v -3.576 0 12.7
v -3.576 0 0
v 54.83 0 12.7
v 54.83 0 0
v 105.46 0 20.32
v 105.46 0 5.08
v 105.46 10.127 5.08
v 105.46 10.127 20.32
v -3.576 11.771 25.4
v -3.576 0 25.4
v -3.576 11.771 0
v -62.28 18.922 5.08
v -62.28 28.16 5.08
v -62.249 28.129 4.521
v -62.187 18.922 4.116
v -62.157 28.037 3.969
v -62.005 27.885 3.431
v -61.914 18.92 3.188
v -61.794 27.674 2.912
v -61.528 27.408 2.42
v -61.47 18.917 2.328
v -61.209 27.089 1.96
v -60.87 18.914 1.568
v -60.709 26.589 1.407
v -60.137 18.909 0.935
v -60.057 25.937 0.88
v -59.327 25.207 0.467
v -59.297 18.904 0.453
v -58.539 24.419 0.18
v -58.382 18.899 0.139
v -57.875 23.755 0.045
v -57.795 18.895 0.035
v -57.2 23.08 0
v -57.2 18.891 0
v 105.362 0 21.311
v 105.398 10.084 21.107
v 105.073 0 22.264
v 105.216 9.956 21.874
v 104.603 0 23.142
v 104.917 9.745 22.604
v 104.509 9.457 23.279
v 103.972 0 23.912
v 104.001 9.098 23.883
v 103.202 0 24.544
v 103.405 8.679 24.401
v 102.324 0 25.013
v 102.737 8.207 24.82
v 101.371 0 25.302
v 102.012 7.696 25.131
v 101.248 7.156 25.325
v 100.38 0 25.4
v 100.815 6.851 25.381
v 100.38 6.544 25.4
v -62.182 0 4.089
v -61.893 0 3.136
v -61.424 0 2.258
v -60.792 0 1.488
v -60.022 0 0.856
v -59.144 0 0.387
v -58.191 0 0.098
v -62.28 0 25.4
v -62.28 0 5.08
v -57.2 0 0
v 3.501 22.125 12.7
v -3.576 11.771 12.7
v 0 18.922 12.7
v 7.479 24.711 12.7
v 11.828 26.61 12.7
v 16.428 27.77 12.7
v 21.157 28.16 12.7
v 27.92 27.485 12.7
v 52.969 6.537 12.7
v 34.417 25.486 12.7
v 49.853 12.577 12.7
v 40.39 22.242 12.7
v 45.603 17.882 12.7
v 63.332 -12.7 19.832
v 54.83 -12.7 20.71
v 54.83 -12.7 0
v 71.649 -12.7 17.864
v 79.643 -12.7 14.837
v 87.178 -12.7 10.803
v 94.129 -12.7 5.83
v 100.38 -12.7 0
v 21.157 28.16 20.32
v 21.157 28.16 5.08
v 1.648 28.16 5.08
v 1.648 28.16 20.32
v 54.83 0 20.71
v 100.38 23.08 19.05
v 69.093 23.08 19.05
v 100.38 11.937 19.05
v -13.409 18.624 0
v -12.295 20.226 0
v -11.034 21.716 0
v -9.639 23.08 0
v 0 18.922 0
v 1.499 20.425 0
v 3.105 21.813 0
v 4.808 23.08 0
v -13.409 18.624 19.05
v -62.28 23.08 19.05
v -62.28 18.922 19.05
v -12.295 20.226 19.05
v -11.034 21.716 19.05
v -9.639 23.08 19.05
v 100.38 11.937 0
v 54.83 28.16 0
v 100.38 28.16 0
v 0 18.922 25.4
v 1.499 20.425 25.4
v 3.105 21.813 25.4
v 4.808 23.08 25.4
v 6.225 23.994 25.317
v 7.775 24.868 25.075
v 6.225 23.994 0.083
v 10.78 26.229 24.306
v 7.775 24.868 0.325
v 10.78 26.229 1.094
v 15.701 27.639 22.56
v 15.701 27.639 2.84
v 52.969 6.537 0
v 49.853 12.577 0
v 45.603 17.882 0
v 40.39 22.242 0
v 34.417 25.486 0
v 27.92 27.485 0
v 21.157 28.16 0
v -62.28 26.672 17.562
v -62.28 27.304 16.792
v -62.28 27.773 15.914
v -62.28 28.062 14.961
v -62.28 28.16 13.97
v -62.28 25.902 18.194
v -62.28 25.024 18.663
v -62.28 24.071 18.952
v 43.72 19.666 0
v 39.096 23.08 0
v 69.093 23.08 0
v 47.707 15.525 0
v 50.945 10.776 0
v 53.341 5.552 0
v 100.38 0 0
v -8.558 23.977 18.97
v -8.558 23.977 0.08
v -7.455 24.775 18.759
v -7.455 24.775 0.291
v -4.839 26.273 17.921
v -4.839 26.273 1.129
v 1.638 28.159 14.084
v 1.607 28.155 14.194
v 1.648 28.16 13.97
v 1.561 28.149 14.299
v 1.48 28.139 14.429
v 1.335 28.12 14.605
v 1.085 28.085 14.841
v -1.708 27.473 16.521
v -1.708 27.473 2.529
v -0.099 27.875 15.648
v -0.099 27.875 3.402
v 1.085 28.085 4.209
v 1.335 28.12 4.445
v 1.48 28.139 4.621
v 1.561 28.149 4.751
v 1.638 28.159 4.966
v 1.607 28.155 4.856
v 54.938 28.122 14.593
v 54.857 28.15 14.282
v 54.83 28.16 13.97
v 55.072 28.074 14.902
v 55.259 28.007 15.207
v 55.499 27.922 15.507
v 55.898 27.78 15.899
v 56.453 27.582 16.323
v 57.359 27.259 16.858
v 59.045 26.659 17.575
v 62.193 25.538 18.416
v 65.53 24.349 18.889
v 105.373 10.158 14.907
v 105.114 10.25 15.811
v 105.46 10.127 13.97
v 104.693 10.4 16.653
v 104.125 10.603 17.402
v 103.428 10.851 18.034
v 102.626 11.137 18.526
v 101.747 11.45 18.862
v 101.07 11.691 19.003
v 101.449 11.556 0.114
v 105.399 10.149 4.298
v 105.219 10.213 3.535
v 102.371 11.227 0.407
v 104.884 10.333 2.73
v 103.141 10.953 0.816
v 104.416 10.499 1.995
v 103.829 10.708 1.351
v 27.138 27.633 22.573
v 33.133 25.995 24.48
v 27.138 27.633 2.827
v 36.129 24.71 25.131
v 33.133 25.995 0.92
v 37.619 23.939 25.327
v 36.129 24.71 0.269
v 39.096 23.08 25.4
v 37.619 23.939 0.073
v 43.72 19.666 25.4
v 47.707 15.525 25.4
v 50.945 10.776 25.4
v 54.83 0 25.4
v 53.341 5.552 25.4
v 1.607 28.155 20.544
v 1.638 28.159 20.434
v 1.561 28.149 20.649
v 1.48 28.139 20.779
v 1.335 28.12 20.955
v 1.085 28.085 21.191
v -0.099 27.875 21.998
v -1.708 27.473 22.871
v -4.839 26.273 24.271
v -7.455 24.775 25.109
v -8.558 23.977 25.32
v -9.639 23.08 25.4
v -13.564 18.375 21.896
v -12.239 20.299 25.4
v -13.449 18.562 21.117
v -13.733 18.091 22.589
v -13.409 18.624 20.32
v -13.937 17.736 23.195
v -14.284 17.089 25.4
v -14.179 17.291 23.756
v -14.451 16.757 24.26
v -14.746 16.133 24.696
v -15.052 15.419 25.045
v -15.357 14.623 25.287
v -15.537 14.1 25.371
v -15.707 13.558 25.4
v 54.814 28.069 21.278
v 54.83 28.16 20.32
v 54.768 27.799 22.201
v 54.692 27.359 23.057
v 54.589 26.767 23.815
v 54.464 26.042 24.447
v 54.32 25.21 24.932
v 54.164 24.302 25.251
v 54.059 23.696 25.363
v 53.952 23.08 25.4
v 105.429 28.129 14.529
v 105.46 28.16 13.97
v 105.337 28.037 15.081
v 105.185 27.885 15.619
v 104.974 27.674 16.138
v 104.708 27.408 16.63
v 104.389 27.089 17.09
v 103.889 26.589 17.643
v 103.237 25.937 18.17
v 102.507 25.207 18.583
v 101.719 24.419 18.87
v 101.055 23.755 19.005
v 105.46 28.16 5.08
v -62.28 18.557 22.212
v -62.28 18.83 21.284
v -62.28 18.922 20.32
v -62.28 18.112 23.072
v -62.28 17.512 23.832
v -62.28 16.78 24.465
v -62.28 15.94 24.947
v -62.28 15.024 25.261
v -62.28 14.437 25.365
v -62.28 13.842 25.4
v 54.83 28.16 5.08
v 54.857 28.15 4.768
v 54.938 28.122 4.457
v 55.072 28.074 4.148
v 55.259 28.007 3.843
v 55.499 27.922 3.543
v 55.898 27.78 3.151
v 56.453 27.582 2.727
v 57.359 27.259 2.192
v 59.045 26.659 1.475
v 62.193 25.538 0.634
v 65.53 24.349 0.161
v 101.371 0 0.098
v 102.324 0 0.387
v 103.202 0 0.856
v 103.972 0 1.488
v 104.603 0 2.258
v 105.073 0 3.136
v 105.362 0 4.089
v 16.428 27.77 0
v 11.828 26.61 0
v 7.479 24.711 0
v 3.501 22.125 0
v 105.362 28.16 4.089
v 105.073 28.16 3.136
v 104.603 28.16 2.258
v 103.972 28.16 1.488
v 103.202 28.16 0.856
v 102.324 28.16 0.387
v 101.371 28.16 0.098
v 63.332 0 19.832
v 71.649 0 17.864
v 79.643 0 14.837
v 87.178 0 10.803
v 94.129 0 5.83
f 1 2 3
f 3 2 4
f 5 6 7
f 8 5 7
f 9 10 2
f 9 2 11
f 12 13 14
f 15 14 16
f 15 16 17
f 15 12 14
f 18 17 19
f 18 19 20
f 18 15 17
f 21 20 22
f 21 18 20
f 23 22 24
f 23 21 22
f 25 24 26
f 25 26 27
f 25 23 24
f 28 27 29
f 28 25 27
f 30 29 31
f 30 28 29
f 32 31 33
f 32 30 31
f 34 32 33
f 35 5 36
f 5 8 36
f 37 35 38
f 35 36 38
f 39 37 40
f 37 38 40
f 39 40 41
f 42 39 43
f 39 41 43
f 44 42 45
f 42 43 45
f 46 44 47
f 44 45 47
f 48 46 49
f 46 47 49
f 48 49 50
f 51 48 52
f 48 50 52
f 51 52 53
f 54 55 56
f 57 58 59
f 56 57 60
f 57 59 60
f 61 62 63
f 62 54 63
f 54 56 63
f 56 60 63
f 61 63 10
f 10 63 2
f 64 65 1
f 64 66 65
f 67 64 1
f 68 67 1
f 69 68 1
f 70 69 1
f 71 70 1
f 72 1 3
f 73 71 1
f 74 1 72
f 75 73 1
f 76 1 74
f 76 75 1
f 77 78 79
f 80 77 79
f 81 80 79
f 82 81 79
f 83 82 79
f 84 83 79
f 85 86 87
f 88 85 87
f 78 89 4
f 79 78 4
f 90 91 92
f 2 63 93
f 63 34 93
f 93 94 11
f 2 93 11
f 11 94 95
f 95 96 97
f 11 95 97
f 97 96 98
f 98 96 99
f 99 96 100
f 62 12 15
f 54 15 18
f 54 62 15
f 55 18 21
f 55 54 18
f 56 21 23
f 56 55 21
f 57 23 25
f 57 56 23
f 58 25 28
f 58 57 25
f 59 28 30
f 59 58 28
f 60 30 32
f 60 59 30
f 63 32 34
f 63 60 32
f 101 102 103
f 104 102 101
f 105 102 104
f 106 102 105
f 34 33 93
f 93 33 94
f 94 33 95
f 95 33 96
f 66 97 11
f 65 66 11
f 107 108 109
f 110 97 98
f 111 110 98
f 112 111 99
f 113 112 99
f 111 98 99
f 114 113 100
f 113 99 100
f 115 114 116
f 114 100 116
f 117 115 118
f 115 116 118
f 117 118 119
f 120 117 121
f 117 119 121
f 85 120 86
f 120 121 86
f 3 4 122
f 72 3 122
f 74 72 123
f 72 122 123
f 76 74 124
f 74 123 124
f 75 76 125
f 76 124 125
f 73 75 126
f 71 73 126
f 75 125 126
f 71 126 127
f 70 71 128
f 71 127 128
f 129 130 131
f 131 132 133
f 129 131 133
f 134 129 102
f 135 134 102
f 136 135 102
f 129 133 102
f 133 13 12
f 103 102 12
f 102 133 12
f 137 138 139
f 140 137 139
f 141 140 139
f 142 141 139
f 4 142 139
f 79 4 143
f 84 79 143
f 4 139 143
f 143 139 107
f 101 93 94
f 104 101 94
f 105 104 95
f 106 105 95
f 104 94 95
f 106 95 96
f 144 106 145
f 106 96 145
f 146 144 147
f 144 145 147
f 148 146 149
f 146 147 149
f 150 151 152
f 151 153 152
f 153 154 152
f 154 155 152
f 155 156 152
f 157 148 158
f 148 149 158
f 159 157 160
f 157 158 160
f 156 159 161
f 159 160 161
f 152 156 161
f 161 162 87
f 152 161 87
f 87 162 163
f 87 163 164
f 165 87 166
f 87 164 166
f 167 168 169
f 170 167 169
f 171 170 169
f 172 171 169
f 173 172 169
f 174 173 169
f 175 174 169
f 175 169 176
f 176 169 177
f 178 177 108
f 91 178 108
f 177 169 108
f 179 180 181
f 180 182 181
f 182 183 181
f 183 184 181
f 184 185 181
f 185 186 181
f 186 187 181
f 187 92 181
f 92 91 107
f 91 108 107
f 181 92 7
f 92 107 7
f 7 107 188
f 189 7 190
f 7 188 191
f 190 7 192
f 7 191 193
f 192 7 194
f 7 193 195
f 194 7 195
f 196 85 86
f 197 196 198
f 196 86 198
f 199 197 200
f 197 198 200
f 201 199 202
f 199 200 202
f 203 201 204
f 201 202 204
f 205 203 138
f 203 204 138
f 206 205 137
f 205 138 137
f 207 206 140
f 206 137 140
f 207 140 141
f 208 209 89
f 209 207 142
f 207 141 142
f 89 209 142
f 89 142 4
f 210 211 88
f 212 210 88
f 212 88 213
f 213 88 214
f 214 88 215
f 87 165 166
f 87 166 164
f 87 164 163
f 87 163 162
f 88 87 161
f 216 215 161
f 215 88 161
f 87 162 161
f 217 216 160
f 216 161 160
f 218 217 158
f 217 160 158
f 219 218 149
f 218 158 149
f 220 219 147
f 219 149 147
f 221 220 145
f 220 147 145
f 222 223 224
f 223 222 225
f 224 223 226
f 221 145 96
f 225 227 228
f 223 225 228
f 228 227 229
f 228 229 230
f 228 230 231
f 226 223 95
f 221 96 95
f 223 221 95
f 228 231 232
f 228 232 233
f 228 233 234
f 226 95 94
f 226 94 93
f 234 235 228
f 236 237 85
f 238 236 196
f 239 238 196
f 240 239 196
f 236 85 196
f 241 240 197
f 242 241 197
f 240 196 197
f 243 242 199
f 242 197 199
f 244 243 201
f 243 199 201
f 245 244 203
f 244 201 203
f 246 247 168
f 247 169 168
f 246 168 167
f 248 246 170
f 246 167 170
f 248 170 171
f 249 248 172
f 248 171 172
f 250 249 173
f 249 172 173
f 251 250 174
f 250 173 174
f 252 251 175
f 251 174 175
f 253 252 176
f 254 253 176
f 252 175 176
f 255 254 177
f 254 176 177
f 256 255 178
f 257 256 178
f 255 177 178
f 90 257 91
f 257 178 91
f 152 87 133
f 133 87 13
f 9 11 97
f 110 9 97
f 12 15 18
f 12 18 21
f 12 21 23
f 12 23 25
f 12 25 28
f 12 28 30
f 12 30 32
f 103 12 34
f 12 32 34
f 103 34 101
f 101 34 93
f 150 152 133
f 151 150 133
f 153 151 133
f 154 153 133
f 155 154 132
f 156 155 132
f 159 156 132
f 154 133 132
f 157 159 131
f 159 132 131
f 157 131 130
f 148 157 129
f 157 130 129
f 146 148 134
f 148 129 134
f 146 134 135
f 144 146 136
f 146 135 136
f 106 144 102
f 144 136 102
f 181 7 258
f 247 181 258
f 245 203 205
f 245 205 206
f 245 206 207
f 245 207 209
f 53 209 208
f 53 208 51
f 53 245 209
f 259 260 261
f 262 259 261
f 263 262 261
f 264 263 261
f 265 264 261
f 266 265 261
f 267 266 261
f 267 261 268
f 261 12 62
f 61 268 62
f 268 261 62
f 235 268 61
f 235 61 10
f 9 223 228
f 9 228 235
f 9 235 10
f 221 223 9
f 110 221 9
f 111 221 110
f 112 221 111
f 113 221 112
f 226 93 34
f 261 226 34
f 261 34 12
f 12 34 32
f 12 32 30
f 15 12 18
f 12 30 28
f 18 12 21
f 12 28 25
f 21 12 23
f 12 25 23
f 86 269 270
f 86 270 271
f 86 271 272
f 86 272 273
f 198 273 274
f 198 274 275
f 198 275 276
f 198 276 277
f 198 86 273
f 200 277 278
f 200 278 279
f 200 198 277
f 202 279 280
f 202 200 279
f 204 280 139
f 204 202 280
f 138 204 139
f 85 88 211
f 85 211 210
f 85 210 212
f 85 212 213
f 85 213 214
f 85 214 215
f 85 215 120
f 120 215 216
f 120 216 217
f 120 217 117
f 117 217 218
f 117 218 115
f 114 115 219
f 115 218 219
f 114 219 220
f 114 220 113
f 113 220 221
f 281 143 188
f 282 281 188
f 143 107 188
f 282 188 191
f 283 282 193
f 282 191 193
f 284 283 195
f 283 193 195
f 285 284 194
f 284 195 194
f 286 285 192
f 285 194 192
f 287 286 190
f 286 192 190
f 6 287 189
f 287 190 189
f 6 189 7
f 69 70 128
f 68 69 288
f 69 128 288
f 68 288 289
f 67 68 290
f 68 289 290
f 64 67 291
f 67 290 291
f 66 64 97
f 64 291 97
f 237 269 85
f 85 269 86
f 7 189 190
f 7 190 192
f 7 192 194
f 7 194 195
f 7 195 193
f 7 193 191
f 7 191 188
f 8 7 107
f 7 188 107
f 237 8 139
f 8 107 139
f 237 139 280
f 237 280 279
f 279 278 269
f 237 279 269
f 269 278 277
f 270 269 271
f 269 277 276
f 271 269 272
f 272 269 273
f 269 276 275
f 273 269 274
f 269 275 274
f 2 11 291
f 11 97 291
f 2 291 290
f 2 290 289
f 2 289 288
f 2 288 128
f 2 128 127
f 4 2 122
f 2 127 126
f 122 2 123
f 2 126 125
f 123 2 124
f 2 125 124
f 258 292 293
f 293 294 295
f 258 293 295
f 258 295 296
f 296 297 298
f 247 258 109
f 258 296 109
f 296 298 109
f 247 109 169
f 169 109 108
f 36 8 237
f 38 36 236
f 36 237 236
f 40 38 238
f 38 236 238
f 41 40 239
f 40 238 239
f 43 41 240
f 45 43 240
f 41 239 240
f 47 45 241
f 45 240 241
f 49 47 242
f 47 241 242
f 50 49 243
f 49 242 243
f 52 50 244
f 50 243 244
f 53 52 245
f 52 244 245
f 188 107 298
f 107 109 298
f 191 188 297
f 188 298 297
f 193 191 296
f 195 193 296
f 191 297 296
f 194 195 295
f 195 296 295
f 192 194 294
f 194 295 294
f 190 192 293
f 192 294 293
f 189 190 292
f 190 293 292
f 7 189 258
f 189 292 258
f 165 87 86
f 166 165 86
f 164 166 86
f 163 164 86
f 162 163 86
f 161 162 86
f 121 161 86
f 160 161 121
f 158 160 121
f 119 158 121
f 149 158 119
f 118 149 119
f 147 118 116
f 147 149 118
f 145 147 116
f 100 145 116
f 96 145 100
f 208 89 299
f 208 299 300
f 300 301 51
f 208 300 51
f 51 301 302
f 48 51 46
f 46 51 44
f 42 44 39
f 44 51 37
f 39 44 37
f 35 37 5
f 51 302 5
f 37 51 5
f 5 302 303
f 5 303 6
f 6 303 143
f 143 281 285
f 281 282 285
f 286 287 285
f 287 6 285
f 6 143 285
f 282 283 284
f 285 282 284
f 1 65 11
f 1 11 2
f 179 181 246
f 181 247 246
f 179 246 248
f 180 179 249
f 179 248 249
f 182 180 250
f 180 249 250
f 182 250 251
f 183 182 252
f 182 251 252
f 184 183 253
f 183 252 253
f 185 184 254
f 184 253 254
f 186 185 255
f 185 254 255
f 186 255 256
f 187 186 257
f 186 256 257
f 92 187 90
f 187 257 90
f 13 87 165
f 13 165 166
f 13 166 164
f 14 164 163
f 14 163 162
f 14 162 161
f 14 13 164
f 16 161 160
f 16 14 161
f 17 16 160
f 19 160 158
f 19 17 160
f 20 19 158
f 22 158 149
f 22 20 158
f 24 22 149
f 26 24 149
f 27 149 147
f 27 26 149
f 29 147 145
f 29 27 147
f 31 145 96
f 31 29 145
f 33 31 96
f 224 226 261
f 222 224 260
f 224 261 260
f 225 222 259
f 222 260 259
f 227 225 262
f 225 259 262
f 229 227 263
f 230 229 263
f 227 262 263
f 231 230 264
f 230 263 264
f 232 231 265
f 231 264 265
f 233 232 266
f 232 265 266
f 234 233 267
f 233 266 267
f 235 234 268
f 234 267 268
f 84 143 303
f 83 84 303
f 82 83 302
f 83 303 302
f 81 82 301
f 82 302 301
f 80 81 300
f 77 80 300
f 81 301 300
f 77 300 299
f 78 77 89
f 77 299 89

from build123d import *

# Parameters (mm, degrees)
F1_DEPTH = 25.4
F2_DEPTH = 19.05
F3_DEPTH = 12.7
F4_R     = 5.08
F4_2_R   = 5.08
F4_3_R   = 5.08
F4_4_R   = 5.08
F5_R     = 5.08
F5_2_R   = 5.08
F5_3_R   = 5.08
F5_4_R   = 5.08
F7_DEPTH = 12.7


with BuildPart() as f1:
    # F0 (on Top) → F1 (new body)
    with BuildSketch(Plane.XY):
        with BuildLine():
            Line((-62.2796677053, 18.9222916961), (-62.2796677053, 0))
            Line((-62.2796677053, 0), (-3.5758661106, 0))
            Line((-3.5758661106, 0), (-3.5758661106, 11.7705585435))
            Line((-3.5758661106, 11.7705585435), (0, 18.9222916961))
            ThreePointArc((0, 18.9222916961), (9.6142260587, 25.7498536747), (21.1572069675, 28.1599443406))
            Line((21.1572069675, 28.1599443406), (6.5557546914, 28.1599443406))
            Line((6.5557546914, 28.1599443406), (1.6481696245, 28.1599443406))
            ThreePointArc((1.6481696245, 28.1599443406), (-6.9608101144, 25.0977753778), (-13.409496285, 18.6243019998))
            Line((-13.409496285, 18.6243019998), (-62.2796677053, 18.9222916961))
        make_face()
    extrude(amount=F1_DEPTH)

    # F4#3
    f4_3_edges = [f1.edges().sort_by_distance(p)[0] for p in [
        (-37.844582, 18.773297, 25.4),
        (11.402688, 28.159944, 25.4),
    ]]
    fillet(f4_3_edges, radius=F4_3_R)

    # F5#3
    f5_3_edges = [f1.edges().sort_by_distance(p)[0] for p in [
        (11.402688, 28.159944, 0),
        (-62.279668, 9.461146, 0),
    ]]
    fillet(f5_3_edges, radius=F5_3_R)


with BuildPart() as f1b:
    # F0 (on Top) → F1, piece 2 (new body)
    with BuildSketch(Plane.XY):
        with BuildLine():
            ThreePointArc((21.1572069675, 28.1599443406), (43.1050751982, 20.1921357641), (54.8299439251, 0))
            Line((54.8299439251, 0), (105.4596230388, 0))
            Line((105.4596230388, 0), (105.4596230388, 10.1274566612))
            Line((105.4596230388, 10.1274566612), (54.8299439251, 28.1599443406))
            Line((54.8299439251, 28.1599443406), (21.1572069675, 28.1599443406))
        make_face()
    extrude(amount=F1_DEPTH)

    # F4
    f4_edges = [f1b.edges().sort_by_distance(p)[0] for p in [
        (80.144783, 19.143701, 25.4),
        (105.459623, 5.063728, 25.4),
        (37.993575, 28.159944, 25.4),
    ]]
    fillet(f4_edges, radius=F4_R)

    # F5
    f5_edges = [f1b.edges().sort_by_distance(p)[0] for p in [
        (105.459623, 5.063728, 0),
        (37.993575, 28.159944, 0),
    ]]
    fillet(f5_edges, radius=F5_R)

    # F6 (on face) → F7 (join)
    with BuildSketch(Plane.XZ):
        with BuildLine():
            Line((54.8299439251, 0), (100.3796230388, 0))
            ThreePointArc((100.3796230388, 0), (79.6426113996, 14.8370726692), (54.8299439251, 20.7102242857))
            Line((54.8299439251, 20.7102242857), (54.8299439251, 0))
        make_face()
    extrude(amount=F7_DEPTH)


with BuildPart() as f2:
    # F0 (on Top) → F2 (new body)
    with BuildSketch(Plane.XY):
        with BuildLine():
            Line((-62.2796677053, 28.1599443406), (-62.2796677053, 18.9222916961))
            Line((-62.2796677053, 18.9222916961), (-13.409496285, 18.6243019998))
            ThreePointArc((-13.409496285, 18.6243019998), (-6.9608101144, 25.0977753778), (1.6481696245, 28.1599443406))
            Line((1.6481696245, 28.1599443406), (-62.2796677053, 28.1599443406))
        make_face()
    extrude(amount=F2_DEPTH)

    # F4#4
    f4_4_edges = [f2.edges().sort_by_distance(p)[0] for p in [
        (-30.315749, 28.159944, 19.05),
    ]]
    fillet(f4_4_edges, radius=F4_4_R)

    # F5#4
    f5_4_edges = [f2.edges().sort_by_distance(p)[0] for p in [
        (-30.315749, 28.159944, 0),
        (-62.279668, 23.541118, 0),
    ]]
    fillet(f5_4_edges, radius=F5_4_R)


with BuildPart() as f2b:
    # F0 (on Top) → F2, piece 2 (new body)
    with BuildSketch(Plane.XY):
        Polygon((54.8299439251, 28.1599443406), (105.4596230388, 10.1274566612), (105.4596230388, 28.1599443406), align=None)
    extrude(amount=F2_DEPTH)

    # F4#2
    f4_2_edges = [f2b.edges().sort_by_distance(p)[0] for p in [
        (80.144783, 28.159944, 19.05),
        (105.459623, 19.143701, 19.05),
    ]]
    fillet(f4_2_edges, radius=F4_2_R)

    # F5#2
    f5_2_edges = [f2b.edges().sort_by_distance(p)[0] for p in [
        (105.459623, 19.143701, 0),
    ]]
    fillet(f5_2_edges, radius=F5_2_R)


with BuildPart() as f3:
    # F0 (on Top) → F3 (new body)
    with BuildSketch(Plane.XY):
        with BuildLine():
            Line((-3.5758661106, 11.7705585435), (-3.5758661106, 0))
            Line((-3.5758661106, 0), (54.8299439251, 0))
            ThreePointArc((54.8299439251, 0), (43.1050751982, 20.1921357641), (21.1572069675, 28.1599443406))
            ThreePointArc((21.1572069675, 28.1599443406), (9.6142260587, 25.7498536747), (0, 18.9222916961))
            Line((0, 18.9222916961), (-3.5758661106, 11.7705585435))
        make_face()
    extrude(amount=F3_DEPTH)


solid = Compound([f1.part, f1b.part, f2.part, f2b.part, f3.part])
